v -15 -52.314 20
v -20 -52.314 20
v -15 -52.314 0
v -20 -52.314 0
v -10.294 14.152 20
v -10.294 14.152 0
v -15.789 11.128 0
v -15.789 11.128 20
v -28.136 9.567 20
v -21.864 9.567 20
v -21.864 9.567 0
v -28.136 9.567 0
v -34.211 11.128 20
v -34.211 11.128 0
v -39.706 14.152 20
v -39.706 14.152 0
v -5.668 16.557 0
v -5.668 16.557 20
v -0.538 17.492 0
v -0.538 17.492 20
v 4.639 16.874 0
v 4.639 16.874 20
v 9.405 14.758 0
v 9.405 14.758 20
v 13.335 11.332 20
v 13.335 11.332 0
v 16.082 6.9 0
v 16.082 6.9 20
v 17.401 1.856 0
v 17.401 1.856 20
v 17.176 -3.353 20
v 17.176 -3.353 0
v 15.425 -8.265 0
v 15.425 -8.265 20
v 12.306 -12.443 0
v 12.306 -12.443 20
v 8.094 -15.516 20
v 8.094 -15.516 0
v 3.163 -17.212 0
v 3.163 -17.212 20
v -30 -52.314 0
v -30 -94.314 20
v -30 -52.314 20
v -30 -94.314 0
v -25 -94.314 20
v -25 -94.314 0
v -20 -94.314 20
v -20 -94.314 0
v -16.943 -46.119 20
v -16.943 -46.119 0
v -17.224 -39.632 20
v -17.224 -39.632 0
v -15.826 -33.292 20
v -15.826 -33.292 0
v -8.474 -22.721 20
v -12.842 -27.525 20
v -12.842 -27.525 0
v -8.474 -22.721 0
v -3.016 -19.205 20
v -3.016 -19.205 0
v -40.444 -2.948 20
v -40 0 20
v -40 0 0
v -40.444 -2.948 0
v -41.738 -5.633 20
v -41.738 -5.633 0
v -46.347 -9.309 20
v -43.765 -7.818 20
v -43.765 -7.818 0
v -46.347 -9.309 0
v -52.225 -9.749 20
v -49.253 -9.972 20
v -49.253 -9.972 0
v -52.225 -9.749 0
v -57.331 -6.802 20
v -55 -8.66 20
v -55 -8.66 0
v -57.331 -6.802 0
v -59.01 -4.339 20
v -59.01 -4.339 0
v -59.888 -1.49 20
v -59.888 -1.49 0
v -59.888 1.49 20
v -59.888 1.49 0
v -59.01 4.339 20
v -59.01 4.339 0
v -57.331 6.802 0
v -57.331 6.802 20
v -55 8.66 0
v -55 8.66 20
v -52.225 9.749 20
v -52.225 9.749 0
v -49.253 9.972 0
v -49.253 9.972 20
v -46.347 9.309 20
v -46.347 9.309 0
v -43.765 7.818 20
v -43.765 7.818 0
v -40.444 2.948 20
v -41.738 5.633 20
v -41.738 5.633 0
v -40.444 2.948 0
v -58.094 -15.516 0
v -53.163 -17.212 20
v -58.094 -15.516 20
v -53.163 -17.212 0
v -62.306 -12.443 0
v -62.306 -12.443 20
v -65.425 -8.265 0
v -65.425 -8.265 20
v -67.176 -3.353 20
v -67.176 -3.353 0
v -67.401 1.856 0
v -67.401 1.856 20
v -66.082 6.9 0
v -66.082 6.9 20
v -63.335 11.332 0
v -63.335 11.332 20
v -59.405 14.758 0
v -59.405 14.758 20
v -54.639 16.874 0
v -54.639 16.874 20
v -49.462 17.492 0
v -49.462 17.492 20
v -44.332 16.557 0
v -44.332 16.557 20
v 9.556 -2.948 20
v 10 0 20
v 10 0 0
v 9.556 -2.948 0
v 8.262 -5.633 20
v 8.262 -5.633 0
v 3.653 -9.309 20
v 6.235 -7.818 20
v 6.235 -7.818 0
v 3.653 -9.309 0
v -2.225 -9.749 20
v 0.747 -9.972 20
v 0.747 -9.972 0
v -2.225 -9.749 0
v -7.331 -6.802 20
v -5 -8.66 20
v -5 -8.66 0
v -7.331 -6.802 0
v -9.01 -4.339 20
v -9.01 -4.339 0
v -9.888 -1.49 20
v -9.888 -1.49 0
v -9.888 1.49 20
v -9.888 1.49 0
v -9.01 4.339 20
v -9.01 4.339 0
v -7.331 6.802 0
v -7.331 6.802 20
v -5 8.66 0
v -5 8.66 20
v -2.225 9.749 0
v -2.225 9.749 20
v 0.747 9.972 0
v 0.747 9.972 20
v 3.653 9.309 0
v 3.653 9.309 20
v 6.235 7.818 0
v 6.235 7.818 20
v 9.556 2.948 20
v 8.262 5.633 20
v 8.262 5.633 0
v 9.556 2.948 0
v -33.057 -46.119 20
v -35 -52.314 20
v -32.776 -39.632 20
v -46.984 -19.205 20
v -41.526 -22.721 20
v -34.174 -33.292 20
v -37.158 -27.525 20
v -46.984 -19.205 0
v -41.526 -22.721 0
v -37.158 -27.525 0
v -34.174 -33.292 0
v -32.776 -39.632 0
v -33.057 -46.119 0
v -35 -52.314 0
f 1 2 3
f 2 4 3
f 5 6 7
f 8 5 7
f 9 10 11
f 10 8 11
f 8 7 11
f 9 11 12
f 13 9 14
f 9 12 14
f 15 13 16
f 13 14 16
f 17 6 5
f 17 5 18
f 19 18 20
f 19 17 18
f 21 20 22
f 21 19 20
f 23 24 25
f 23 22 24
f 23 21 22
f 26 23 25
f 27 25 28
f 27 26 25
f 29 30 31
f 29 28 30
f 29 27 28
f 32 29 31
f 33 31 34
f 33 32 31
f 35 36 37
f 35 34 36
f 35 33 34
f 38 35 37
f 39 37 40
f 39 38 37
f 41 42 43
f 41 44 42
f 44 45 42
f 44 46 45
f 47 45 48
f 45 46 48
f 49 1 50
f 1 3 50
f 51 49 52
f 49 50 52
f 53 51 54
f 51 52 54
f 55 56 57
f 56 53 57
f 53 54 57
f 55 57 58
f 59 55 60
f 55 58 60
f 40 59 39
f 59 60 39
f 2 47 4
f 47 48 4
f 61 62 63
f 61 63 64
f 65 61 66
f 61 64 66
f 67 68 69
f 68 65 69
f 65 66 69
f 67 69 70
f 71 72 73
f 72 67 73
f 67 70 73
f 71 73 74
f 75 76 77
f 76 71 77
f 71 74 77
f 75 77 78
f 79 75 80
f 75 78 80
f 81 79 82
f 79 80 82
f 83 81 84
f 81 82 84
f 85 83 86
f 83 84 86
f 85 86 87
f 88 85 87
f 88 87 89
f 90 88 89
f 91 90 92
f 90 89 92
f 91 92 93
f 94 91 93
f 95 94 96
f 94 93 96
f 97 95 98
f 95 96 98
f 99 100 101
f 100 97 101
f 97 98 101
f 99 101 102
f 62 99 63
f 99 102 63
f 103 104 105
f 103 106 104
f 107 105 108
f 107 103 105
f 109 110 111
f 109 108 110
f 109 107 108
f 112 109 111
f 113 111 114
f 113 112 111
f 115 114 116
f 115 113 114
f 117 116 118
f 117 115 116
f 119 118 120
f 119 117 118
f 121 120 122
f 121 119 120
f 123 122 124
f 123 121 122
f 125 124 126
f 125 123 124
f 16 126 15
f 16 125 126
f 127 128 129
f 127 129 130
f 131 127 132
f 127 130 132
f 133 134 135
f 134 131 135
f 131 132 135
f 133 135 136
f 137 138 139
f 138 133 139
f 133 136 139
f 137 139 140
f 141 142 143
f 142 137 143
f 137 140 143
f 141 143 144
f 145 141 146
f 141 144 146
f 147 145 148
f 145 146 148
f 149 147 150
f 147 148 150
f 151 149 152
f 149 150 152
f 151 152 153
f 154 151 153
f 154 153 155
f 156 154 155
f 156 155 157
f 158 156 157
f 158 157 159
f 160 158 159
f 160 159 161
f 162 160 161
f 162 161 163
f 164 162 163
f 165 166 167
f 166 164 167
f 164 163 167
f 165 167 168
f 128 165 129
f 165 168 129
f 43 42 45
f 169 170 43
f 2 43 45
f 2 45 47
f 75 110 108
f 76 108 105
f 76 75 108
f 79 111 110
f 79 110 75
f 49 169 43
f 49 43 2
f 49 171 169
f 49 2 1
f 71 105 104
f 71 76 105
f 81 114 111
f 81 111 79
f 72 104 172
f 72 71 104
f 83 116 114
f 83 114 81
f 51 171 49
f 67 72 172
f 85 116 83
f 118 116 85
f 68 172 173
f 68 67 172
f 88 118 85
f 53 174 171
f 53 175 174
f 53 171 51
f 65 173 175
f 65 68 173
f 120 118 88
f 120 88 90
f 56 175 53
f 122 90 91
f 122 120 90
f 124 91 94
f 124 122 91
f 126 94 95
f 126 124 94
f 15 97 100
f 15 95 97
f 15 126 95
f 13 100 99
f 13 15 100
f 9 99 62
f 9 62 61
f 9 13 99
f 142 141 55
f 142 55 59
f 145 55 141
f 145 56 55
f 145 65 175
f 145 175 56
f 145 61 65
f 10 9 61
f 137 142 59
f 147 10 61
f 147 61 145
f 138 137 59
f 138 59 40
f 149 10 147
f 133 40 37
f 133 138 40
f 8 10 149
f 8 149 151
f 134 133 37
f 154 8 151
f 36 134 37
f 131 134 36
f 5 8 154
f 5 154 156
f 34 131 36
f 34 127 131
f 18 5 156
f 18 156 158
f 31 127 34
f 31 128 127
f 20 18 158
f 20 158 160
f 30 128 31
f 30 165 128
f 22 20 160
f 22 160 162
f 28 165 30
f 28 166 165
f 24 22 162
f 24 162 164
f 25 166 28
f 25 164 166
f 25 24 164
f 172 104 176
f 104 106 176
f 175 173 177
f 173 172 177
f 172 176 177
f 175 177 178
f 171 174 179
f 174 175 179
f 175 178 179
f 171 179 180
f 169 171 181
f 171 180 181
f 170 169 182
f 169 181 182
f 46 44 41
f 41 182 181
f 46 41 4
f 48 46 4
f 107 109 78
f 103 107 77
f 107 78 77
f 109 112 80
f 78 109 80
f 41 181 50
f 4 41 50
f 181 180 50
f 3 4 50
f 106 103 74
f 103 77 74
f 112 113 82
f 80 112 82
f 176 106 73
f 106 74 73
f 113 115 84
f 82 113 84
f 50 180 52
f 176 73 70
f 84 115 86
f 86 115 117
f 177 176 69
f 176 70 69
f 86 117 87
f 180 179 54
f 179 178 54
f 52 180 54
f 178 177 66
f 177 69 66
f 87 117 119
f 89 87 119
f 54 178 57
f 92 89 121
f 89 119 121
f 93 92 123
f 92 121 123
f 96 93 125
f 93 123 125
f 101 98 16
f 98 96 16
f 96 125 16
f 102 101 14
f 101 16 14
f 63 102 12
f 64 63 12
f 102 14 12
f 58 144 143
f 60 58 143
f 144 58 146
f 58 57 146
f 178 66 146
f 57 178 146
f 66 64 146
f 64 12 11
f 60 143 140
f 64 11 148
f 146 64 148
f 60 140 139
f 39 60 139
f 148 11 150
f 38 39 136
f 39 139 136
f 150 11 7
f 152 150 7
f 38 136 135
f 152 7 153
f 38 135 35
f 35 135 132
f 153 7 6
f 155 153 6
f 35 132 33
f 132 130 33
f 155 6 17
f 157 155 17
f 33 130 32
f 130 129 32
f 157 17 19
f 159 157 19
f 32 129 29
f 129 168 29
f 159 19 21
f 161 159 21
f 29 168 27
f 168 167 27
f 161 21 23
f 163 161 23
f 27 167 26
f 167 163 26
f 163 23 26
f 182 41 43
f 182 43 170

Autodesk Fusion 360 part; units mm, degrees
sketch "Sketch1" plane through (0, 0, 0) normal (0, 0, 1) x (1, 0, 0)
  circle A0 centre (0, 0) radius 10
  line L0 (0, 0) -> (-50, 0) construction
  circle A1 centre (-50, 0) radius 10
  arc A2 (-39.7059, 14.1521) -> (-10.2941, 14.1521) centre (-25, 34.3693) ccw
  line L1 (9.4868, -28.4605) -> (9.4868, -40.9605)
  line L2 (-50, 0) -> (-50, 17.5) construction
  line L3 (-50, 17.5) -> (0, 17.5) construction
  line L4 (-25, 17.5) -> (-25, -94.314) construction
  line L5 (-25, -94.314) -> (-20, -94.314)
  line L6 (-25, -94.314) -> (-30, -94.314)
  line L7 (-20, -94.314) -> (-20, -52.314)
  line L8 (-30, -94.314) -> (-30, -52.314)
  line L9 (-20, -52.314) -> (-15, -52.314)
  line L10 (-30, -52.314) -> (-35, -52.314)
  arc A3 (-35, -52.314) -> (-53.163, -17.2118) centre (-57.6816, -41.8) ccw
  arc A4 (3.163, -17.2118) -> (-15, -52.314) centre (7.6816, -41.8) ccw
  arc A5 (-39.7059, 14.1521) -> (-53.163, -17.2118) centre (-50, 0) ccw
  arc A6 (3.163, -17.2118) -> (-10.2941, 14.1521) centre (0, 0) ccw
  dimension "d6" = 20
  dimension "d7" = 35
  dimension "d8" = 50
  dimension "d9" = 20
  dimension "d10" = 35
  dimension "d11" = 50
  dimension "d14" = 111.814
  dimension "d15" = 5
  dimension "d16" = 5
  dimension "d17" = 42
  dimension "d18" = 42
  dimension "d19" = 5
  dimension "d20" = 5
  dimension "d22" = 50
  dimension "d23" = 50
extrude "Extrude1" add sketch "Sketch1" along normal blind 20
